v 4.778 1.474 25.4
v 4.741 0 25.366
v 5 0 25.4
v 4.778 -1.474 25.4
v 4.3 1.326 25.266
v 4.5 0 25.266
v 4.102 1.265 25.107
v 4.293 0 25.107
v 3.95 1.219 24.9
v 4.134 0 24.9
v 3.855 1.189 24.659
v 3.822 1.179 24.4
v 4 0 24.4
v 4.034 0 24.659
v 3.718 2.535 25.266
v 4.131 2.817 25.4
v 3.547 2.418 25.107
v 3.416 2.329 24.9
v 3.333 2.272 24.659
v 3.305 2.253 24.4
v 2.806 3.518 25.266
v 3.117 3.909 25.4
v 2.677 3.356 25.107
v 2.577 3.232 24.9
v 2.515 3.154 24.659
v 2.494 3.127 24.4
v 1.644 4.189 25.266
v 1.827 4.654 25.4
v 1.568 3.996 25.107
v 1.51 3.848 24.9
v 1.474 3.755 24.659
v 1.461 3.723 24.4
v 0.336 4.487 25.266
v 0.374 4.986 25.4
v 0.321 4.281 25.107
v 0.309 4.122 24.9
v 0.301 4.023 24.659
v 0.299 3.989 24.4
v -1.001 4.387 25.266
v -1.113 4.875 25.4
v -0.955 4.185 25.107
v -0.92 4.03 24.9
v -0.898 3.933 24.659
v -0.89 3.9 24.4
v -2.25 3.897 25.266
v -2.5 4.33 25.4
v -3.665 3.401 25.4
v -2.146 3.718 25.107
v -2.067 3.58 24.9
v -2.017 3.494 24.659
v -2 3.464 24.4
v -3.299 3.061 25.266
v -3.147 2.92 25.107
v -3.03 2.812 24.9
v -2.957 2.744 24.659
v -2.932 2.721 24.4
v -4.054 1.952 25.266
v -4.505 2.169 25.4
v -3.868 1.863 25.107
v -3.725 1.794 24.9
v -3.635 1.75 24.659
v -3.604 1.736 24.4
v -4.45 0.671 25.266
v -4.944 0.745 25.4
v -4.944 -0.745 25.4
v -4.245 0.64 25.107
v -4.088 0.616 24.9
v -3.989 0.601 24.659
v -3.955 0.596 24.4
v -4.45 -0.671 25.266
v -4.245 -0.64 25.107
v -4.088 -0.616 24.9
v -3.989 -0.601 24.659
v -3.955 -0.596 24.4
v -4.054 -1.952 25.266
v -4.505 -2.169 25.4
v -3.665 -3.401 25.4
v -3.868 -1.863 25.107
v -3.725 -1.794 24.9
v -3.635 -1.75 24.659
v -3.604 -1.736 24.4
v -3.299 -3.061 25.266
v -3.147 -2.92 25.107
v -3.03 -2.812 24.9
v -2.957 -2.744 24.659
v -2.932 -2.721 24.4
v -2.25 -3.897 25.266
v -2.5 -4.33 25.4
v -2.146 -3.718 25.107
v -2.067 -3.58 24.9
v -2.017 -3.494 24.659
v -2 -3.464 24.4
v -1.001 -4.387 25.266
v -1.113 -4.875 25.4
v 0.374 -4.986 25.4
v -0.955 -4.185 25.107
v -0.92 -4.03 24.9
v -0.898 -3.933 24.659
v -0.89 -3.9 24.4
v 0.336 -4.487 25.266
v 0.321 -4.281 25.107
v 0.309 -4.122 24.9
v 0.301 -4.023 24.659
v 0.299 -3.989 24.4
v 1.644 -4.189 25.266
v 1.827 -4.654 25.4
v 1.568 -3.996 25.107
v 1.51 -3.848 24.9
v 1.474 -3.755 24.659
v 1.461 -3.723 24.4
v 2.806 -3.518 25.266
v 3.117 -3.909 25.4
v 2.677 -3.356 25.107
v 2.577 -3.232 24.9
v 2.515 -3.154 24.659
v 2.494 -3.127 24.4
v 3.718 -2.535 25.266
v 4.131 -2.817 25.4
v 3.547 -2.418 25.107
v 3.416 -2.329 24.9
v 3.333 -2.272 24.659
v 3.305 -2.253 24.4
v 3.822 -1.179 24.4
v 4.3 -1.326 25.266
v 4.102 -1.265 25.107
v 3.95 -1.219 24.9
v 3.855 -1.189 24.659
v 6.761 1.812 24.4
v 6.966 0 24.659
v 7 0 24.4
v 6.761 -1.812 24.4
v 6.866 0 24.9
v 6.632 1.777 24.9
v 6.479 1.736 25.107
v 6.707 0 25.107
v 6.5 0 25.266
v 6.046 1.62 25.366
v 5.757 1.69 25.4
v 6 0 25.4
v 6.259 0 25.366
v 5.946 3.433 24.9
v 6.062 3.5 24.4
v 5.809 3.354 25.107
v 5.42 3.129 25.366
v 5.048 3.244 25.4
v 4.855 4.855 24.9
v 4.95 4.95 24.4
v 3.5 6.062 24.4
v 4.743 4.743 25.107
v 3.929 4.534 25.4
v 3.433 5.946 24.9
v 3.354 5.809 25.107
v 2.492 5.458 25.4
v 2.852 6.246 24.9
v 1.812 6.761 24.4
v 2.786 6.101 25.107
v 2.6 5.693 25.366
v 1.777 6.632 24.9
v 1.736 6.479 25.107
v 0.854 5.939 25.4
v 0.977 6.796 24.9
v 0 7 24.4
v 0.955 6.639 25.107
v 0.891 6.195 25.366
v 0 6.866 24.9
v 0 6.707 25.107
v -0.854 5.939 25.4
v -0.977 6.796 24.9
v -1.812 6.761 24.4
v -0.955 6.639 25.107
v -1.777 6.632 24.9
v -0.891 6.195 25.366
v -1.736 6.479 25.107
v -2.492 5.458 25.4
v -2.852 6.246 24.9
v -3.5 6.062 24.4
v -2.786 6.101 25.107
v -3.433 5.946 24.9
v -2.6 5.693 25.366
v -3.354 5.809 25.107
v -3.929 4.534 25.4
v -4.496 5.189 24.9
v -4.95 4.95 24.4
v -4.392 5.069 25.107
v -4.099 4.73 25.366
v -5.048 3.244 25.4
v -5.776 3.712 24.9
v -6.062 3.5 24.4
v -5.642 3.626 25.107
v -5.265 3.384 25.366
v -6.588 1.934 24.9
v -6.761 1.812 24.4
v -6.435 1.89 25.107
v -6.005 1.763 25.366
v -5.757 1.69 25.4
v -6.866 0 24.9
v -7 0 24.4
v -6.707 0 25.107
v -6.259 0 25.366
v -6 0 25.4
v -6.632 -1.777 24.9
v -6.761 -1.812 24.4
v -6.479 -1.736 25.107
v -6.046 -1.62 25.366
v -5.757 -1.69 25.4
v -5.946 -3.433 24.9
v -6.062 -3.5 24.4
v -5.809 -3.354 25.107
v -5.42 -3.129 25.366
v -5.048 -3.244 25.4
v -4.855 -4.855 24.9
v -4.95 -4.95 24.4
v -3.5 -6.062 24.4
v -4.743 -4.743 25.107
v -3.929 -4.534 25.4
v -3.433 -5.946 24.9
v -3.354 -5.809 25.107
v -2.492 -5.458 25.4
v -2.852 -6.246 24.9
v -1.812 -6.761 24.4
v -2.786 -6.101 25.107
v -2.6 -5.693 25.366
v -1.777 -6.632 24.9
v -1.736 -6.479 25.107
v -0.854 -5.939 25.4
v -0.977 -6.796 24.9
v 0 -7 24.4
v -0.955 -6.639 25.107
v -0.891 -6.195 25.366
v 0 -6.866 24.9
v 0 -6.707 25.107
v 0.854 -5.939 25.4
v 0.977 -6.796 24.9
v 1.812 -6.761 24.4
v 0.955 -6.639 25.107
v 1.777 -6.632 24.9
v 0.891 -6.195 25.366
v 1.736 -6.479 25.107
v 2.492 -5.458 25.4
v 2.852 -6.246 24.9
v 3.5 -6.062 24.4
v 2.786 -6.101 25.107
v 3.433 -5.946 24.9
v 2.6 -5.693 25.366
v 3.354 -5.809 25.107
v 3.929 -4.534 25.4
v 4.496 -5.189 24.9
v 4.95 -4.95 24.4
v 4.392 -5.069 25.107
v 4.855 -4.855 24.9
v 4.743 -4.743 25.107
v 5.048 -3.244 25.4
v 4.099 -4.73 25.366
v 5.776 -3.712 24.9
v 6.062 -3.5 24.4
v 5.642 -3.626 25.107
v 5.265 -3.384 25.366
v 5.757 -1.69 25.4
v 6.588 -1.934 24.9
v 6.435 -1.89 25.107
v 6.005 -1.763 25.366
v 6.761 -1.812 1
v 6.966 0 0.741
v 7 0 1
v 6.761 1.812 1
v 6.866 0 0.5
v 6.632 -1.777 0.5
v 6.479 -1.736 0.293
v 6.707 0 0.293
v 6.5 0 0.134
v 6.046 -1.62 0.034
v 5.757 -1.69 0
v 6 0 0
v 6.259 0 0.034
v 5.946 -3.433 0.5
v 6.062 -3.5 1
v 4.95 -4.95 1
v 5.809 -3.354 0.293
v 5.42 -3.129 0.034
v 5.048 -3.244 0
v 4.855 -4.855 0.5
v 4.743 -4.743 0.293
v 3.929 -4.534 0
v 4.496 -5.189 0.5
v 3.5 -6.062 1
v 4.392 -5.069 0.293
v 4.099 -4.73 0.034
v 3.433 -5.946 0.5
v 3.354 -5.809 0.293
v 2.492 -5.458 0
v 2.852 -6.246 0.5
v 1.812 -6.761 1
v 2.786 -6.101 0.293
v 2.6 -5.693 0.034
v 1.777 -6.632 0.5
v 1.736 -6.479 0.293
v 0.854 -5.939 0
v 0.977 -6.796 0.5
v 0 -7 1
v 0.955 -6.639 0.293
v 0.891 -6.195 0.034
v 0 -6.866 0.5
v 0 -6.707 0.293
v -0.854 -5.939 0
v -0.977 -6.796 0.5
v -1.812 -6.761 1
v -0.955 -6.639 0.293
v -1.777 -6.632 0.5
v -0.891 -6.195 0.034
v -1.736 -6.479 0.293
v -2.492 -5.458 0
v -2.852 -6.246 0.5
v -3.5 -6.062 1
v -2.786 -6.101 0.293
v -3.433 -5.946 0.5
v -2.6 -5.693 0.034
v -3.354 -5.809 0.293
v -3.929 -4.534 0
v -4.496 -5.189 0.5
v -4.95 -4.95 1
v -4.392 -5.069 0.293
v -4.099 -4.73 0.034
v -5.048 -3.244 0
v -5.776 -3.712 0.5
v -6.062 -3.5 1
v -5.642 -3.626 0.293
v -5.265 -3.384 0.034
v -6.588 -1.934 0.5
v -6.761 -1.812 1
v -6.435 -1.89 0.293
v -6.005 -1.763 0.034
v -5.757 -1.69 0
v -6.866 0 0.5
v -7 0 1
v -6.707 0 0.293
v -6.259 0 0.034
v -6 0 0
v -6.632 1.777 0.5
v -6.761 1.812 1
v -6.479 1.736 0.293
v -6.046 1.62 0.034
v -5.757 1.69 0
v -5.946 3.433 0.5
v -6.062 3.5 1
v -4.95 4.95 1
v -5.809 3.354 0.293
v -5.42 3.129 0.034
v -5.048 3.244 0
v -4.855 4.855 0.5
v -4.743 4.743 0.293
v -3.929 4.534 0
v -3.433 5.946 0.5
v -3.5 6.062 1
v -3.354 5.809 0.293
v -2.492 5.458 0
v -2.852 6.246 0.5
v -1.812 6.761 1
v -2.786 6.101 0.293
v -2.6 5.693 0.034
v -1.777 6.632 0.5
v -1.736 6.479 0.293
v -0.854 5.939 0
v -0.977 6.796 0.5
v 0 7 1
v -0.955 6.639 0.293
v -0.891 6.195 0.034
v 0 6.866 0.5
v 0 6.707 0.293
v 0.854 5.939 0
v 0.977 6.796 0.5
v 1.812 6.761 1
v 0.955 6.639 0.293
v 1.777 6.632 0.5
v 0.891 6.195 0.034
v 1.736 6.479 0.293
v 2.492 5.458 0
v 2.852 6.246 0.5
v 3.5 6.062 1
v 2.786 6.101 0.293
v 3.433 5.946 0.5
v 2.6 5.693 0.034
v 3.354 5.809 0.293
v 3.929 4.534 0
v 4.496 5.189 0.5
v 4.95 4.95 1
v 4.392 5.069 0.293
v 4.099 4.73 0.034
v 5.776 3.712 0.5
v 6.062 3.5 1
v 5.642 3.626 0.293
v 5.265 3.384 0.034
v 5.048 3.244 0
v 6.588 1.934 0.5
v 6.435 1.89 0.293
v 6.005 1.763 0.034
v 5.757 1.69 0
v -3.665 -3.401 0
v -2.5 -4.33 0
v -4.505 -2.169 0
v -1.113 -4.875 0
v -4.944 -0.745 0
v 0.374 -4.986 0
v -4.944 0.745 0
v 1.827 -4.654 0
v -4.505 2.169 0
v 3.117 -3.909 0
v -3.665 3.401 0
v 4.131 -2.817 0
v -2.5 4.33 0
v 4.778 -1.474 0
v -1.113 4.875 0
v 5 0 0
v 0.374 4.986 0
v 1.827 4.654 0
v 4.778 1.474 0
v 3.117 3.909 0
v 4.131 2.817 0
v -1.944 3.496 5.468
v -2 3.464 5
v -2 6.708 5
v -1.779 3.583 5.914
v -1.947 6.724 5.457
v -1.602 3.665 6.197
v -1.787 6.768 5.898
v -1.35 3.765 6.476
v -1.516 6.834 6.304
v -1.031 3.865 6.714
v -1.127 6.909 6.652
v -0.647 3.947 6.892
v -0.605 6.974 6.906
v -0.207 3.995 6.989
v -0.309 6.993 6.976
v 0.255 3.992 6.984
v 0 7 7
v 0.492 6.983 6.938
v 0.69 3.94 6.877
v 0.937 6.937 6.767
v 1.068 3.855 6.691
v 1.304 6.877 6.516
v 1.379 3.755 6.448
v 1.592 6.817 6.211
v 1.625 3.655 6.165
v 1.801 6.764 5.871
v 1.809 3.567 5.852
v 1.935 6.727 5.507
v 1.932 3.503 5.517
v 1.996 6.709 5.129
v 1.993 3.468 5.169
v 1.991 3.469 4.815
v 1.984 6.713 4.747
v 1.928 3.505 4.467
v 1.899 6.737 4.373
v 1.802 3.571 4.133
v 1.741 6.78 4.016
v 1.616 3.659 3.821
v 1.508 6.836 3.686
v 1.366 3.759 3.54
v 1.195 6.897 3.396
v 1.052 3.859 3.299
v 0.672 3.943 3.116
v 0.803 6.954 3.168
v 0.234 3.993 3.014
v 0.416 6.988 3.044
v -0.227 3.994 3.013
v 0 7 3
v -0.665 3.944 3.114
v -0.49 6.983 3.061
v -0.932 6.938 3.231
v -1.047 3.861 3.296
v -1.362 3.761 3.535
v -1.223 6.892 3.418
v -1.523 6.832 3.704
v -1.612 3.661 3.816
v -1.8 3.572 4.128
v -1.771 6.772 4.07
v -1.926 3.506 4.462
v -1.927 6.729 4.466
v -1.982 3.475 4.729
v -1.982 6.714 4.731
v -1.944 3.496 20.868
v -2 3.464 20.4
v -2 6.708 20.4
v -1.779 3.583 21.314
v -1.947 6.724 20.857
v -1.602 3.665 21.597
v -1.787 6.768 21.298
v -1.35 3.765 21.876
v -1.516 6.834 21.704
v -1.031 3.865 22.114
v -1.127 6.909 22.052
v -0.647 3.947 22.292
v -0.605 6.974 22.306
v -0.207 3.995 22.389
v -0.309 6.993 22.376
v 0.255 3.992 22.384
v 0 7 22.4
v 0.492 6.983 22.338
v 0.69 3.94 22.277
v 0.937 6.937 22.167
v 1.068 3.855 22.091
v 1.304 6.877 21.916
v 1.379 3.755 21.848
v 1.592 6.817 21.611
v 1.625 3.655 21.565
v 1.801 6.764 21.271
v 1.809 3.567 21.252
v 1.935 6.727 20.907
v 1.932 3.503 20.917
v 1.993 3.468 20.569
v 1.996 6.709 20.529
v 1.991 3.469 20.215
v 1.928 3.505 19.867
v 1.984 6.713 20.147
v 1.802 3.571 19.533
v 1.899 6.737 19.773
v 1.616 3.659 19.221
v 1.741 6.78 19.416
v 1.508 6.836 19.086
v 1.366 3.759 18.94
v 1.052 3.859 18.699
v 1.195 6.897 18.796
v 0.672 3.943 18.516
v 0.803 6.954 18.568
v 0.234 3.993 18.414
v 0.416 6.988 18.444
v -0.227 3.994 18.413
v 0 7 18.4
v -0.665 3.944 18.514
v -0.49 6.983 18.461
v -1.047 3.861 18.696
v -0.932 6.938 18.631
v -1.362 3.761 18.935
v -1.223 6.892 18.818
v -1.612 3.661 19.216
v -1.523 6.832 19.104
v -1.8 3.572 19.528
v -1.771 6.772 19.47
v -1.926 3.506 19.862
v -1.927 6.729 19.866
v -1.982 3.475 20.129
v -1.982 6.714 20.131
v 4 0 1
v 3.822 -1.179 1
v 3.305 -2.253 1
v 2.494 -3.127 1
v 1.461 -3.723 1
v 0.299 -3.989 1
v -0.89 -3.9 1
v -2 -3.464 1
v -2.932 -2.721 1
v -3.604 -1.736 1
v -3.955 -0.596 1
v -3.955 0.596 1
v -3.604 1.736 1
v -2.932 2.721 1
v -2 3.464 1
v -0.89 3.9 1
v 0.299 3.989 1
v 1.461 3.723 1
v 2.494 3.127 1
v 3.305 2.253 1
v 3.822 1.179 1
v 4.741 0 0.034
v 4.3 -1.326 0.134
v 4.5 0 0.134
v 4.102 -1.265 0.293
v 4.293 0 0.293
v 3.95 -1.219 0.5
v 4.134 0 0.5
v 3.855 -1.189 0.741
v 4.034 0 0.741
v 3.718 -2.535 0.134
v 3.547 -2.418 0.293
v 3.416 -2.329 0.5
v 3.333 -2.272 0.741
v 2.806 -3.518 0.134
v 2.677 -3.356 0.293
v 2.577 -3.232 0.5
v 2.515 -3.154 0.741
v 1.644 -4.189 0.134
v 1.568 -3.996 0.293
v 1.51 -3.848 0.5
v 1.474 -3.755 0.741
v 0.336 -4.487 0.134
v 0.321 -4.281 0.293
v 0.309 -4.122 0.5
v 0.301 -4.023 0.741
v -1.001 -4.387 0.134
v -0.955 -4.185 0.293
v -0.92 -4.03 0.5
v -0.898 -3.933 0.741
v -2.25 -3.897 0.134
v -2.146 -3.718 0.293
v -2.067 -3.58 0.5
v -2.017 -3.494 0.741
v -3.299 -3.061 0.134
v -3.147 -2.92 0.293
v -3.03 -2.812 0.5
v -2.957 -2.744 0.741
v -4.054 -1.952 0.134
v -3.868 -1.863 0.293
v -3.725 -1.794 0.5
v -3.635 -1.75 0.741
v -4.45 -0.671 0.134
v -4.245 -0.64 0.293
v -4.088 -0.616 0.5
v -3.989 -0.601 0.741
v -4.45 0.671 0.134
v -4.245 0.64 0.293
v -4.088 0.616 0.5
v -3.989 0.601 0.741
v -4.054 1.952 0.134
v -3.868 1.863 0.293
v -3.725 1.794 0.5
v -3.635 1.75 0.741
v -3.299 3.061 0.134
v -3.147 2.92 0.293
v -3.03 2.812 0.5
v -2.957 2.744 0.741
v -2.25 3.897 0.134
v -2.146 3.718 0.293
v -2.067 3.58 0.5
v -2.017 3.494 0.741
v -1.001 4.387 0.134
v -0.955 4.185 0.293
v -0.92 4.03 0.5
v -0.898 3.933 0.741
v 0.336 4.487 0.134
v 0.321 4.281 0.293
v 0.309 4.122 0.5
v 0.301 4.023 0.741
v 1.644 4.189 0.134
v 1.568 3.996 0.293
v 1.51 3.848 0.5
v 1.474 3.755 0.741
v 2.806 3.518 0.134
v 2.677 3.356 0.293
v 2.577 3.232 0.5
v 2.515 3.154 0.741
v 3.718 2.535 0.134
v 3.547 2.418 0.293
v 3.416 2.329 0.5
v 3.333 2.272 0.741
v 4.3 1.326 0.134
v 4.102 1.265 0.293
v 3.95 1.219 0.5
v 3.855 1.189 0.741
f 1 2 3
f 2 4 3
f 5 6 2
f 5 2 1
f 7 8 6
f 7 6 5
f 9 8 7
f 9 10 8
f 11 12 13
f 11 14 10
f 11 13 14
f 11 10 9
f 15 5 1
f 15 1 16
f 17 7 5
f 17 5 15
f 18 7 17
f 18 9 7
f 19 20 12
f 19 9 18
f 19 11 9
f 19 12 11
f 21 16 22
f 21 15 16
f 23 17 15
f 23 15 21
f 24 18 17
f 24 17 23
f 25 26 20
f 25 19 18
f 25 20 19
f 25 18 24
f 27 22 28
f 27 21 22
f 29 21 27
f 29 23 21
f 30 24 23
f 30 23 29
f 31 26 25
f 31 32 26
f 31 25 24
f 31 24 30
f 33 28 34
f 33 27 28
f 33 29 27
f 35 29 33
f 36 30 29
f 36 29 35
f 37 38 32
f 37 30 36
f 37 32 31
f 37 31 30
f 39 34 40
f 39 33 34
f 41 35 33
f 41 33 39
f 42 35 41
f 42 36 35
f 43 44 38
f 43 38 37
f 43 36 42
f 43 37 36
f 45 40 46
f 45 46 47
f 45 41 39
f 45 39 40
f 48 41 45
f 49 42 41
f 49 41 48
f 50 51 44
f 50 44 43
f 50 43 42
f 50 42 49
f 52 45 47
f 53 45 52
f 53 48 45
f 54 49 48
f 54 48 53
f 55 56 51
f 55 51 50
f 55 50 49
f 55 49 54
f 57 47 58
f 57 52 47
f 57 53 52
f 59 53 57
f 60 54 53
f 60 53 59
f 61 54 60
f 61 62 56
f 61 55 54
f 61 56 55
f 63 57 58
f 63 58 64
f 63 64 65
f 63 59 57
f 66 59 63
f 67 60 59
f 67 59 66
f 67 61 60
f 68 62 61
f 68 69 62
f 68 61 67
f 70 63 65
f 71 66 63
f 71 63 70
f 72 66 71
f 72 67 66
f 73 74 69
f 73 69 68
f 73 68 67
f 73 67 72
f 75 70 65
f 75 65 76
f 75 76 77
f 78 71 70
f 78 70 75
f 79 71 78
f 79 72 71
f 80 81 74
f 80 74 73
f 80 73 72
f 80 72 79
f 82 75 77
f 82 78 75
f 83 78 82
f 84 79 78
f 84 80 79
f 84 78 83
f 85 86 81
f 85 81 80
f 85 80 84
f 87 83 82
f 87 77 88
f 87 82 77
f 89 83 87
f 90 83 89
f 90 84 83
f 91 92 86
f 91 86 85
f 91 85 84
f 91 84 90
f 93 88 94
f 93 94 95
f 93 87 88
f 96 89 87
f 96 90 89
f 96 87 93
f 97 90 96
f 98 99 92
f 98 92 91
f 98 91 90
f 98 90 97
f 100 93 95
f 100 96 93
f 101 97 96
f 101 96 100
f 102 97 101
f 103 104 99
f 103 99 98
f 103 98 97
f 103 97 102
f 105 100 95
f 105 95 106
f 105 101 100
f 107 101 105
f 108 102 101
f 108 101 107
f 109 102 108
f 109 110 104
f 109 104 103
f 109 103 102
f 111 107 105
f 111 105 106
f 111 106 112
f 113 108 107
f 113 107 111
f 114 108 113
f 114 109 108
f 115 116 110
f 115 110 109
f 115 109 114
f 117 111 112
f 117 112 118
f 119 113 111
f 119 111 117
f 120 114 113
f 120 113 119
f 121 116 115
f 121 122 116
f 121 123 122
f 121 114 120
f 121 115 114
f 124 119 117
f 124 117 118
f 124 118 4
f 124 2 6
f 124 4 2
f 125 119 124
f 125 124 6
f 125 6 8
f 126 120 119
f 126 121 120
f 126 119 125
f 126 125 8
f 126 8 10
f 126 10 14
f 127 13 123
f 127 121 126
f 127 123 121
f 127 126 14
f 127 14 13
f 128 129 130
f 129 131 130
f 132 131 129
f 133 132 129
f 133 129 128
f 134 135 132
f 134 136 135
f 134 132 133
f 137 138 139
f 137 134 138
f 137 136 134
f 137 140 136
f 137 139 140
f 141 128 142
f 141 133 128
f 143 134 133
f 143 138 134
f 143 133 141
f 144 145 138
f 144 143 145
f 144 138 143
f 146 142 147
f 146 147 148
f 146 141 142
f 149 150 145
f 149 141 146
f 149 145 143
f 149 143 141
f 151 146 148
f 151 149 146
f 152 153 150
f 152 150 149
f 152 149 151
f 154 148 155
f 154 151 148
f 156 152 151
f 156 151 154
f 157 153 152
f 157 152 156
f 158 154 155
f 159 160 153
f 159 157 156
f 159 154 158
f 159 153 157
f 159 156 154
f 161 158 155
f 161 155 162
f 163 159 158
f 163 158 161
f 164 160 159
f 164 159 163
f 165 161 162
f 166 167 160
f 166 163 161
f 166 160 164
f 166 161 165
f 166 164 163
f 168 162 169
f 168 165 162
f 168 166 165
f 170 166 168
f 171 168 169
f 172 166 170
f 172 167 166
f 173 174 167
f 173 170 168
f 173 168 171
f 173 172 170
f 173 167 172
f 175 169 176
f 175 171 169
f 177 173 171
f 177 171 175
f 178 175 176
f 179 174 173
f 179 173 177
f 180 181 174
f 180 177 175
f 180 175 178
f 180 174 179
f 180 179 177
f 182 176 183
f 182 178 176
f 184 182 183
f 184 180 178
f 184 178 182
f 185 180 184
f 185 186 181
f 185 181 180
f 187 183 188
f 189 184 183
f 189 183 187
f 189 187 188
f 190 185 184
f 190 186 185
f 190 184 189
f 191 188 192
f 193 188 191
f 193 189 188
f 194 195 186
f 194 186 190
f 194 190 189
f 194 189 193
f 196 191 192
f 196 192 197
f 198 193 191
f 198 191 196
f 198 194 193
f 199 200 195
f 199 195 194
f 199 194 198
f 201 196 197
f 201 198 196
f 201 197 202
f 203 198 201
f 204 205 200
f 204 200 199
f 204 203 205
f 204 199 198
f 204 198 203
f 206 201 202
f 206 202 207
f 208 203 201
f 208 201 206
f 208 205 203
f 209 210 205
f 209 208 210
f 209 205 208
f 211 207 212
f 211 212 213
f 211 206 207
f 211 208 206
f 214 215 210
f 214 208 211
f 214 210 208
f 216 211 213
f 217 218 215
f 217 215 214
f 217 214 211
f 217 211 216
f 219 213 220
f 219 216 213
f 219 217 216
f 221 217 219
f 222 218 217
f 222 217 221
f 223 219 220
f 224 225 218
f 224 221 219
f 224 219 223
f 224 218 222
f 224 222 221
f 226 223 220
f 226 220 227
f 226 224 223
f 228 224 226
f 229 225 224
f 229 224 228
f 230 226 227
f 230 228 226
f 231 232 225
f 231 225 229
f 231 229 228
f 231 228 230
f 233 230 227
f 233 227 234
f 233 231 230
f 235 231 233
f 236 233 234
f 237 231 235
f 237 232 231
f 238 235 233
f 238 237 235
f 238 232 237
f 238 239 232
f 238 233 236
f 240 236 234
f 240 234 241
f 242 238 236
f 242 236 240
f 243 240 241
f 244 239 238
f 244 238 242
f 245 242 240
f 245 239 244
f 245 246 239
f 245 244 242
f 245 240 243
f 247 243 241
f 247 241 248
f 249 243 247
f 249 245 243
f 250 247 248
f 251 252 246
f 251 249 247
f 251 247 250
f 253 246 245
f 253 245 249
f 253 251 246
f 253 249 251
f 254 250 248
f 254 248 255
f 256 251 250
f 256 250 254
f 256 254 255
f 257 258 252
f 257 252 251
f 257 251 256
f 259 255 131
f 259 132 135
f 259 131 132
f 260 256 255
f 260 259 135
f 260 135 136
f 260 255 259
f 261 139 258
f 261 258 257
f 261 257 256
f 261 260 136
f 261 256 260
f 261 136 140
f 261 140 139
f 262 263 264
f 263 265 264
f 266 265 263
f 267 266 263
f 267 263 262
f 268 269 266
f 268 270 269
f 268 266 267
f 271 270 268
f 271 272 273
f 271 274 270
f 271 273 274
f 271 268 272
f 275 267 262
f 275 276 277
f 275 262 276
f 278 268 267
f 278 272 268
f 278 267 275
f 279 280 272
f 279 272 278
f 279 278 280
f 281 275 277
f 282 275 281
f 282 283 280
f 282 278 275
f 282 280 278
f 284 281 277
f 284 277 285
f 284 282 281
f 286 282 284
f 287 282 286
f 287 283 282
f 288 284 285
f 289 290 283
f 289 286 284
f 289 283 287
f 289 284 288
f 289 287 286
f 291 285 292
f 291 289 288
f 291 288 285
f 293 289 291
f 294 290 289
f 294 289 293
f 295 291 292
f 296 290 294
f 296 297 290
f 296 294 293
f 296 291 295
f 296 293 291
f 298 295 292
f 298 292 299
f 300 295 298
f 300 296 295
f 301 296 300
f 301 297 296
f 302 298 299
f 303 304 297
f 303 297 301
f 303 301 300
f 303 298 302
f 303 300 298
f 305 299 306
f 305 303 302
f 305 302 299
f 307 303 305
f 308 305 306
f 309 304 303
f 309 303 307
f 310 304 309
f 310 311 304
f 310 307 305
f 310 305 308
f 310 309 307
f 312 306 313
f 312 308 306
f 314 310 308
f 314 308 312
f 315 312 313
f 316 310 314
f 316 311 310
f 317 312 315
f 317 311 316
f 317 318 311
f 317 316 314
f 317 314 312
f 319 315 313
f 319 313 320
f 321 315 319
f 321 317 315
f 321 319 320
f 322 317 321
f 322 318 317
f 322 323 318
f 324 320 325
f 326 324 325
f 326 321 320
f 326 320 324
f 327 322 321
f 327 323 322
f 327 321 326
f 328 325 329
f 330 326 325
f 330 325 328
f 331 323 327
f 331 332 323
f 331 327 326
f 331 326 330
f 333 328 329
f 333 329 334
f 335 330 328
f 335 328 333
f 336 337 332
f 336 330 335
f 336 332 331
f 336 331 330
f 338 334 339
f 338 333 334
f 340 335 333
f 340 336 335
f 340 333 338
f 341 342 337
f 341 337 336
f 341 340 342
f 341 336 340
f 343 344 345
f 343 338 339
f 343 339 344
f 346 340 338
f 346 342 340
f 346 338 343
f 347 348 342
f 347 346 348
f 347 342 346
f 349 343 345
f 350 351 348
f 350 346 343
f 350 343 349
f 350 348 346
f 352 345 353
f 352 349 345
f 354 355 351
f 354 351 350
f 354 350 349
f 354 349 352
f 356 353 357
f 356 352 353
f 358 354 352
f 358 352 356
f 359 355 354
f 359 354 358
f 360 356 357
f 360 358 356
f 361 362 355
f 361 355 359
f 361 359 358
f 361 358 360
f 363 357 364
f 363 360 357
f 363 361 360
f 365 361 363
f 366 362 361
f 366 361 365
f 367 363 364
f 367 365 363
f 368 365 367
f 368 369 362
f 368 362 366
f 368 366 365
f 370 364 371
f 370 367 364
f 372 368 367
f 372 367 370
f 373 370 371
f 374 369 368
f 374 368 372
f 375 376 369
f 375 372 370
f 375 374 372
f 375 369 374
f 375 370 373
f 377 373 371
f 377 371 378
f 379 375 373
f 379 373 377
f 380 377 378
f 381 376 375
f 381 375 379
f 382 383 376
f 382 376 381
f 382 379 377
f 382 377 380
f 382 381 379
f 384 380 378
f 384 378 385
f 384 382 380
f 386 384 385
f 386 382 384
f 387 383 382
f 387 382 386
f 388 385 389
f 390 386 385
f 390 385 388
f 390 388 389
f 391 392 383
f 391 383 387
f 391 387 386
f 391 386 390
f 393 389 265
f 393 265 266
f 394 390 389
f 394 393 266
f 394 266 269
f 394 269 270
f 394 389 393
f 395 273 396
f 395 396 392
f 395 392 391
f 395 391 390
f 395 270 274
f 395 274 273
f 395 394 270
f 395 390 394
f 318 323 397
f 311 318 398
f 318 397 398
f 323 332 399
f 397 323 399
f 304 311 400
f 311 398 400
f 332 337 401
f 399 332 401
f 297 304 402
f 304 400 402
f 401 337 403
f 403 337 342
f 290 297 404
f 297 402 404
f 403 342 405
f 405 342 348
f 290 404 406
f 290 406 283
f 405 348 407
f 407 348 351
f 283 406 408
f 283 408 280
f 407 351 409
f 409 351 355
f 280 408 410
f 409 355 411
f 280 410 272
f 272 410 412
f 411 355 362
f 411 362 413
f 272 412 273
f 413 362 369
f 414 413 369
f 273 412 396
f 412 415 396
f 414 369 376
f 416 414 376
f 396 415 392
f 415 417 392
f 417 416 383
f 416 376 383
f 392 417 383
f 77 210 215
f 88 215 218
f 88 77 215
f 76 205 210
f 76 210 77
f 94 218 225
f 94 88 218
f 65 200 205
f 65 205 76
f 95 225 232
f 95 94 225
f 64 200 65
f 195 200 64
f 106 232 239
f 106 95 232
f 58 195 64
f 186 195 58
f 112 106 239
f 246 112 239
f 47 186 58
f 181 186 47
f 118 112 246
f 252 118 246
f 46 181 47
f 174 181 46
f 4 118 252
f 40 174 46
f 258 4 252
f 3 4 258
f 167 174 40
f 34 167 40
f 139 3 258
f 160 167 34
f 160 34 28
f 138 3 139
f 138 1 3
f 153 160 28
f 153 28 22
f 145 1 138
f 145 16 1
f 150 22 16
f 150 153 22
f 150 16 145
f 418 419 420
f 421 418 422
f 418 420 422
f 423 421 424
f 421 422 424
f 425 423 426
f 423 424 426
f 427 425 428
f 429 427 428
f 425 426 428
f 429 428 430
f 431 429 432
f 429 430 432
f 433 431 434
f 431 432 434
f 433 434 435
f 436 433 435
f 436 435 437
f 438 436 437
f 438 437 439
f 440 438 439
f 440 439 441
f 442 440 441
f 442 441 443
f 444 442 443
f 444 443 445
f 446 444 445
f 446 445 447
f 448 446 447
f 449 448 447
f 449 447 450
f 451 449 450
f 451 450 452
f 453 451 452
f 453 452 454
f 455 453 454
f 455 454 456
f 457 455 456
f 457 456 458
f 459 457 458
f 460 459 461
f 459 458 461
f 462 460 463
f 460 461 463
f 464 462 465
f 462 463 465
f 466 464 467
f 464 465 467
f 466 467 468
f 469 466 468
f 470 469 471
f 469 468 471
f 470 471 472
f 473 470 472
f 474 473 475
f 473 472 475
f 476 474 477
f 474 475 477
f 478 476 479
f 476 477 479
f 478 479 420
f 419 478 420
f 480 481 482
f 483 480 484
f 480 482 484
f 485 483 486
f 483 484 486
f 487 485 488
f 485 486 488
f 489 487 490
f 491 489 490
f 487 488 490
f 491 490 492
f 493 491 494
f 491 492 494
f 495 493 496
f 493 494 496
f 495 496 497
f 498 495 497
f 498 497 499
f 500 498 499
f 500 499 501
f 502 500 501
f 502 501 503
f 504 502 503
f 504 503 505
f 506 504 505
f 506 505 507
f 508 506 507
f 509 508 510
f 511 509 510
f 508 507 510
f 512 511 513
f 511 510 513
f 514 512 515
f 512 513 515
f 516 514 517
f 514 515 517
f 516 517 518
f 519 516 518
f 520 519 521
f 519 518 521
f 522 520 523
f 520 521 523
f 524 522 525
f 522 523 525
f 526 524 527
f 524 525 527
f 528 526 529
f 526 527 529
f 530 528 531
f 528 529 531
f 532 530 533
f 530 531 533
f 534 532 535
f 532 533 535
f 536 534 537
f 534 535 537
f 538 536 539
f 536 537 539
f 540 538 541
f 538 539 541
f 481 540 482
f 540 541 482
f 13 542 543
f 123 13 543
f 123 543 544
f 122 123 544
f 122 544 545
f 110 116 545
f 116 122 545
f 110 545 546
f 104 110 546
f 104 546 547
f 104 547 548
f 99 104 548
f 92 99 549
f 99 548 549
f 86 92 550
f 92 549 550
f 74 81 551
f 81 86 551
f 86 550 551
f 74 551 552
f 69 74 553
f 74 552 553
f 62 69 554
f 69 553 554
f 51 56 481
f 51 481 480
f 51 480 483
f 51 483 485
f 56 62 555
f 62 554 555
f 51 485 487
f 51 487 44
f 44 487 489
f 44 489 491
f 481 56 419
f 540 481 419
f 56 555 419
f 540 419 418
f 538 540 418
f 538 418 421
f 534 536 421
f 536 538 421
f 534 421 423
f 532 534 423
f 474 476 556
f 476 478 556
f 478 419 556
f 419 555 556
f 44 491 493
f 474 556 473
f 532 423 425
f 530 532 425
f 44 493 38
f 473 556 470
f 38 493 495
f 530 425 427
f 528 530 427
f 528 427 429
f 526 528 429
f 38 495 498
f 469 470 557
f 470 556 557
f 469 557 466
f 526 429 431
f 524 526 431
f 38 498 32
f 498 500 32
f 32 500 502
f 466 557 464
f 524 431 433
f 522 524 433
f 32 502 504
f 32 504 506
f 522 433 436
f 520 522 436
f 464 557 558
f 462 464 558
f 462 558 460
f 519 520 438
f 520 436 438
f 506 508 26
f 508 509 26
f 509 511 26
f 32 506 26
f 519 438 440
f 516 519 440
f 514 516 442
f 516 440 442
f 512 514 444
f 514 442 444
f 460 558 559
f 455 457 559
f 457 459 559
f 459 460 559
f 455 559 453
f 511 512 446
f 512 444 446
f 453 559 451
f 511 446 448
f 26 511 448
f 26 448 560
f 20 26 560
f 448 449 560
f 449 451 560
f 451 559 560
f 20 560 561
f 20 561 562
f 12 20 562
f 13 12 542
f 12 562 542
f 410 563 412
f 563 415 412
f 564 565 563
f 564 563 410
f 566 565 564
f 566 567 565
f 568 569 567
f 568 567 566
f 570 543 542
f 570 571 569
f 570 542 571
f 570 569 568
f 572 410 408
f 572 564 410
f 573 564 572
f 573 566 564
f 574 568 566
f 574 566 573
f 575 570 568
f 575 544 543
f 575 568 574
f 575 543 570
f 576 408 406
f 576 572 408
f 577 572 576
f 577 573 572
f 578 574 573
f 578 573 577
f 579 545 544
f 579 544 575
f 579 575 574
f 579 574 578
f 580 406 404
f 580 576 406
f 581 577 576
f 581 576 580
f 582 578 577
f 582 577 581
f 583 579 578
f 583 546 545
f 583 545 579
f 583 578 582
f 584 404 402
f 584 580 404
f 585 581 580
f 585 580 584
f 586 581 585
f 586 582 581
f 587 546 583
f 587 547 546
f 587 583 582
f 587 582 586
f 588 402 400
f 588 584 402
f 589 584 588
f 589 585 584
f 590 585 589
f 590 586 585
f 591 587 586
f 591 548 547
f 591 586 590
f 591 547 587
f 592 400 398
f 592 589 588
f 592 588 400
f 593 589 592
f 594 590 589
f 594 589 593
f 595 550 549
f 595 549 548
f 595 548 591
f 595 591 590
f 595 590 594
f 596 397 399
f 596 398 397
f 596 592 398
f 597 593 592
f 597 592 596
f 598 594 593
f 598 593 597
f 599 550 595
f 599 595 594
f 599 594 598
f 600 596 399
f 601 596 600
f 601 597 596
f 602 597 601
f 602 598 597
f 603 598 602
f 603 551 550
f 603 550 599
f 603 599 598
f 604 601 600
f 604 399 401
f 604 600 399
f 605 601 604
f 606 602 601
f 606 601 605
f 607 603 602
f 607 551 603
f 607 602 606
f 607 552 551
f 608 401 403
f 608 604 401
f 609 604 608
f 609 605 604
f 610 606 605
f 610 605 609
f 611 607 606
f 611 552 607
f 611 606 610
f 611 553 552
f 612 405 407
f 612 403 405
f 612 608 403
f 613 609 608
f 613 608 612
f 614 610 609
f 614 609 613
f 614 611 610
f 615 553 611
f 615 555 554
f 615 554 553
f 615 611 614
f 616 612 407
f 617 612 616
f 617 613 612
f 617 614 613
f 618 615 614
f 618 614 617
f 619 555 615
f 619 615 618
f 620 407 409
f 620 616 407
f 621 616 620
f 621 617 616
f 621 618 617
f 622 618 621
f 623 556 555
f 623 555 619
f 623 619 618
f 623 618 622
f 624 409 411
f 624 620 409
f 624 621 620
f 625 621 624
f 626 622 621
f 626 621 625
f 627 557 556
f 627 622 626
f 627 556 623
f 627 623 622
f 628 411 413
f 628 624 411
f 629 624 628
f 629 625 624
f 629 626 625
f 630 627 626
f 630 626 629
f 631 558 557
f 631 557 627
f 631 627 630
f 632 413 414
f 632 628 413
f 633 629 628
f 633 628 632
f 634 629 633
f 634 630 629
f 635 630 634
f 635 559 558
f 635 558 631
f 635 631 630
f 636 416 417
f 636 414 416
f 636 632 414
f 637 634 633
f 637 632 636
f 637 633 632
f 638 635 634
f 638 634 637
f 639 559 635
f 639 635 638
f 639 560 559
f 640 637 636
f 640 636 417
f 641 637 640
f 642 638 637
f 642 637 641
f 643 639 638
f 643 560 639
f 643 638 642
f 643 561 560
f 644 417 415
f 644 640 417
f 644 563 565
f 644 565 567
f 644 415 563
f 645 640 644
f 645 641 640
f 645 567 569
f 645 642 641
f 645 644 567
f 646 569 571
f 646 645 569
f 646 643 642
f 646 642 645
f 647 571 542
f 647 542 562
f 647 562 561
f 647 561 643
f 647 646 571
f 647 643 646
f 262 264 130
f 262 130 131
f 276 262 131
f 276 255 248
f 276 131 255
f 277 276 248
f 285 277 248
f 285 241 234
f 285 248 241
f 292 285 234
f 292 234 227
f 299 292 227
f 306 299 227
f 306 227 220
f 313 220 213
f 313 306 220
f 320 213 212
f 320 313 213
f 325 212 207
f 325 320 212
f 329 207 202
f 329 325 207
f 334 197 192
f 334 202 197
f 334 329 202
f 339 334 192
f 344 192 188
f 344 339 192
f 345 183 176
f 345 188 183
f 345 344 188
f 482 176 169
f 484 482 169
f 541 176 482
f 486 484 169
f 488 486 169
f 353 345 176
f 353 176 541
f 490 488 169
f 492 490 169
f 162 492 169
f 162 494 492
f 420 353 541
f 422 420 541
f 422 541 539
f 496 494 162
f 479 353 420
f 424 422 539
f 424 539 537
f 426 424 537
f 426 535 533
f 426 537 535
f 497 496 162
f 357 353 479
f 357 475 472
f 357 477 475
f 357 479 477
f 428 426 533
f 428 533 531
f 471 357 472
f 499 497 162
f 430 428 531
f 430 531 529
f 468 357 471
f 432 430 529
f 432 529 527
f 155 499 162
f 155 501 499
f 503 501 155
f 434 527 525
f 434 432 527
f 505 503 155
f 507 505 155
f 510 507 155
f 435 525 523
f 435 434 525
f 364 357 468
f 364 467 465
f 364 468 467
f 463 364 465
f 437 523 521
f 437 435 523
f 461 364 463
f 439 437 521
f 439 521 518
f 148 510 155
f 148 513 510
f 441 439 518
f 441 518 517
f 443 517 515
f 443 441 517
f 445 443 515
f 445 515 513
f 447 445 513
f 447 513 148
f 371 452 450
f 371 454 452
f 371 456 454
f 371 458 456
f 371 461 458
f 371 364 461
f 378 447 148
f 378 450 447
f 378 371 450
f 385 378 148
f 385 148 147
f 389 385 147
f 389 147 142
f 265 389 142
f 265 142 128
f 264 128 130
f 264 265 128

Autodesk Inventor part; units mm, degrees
ref_plane "YZ Plane" through (0, 0, 0) normal (1, 0, 0) x (0, 1, 0)
ref_plane "XY Plane" through (0, 0, 0) normal (0, 0, 1) x (1, 0, 0)
sketch "Sketch1" plane through (0, 0, 0) normal (0, 0, 1) x (1, 0, 0)
  circle A0 centre (0, 0) radius 7
  circle A1 centre (0, 0) radius 4
  dimension "d0" = 14
  dimension "d1" = 8
extrude "Extrusion1" add sketch "Sketch1" along normal blind 25.4
fillet "Fillet1" radius 1 2 edges at (-7, 0, 25.4) (-7, 0, 0)
fillet "Fillet2" radius 1 2 edges at (-4, 0, 25.4) (-4, 0, 0)
ref_plane "Work Plane1" through (0, 7, 0) normal (0, 1, 0) x (-1, 0, 0)
sketch "Sketch2" plane through (0, 7, 0) normal (0, 1, 0) x (-1, 0, 0)
  circle A0 centre (0, 5) radius 2
  circle A1 centre (0, 20.4) radius 2
  line L0 (-6, 25.4) -> (6, 25.4) projected
  point P0 (0, 0)
  dimension "d6" = 4
  dimension "d7" = 5
  dimension "d8" = 5
extrude "Extrusion2" cut sketch "Sketch2" against normal up to next
thread "Thread1" size "M4x0.7" class "6H" standard "ANSI Metric M Profile" full length
thread "Thread2" size "M4x0.7" class "6H" standard "ANSI Metric M Profile" full length
equation "\"d8\" = d7"
properties part number "AcopleMotor"
